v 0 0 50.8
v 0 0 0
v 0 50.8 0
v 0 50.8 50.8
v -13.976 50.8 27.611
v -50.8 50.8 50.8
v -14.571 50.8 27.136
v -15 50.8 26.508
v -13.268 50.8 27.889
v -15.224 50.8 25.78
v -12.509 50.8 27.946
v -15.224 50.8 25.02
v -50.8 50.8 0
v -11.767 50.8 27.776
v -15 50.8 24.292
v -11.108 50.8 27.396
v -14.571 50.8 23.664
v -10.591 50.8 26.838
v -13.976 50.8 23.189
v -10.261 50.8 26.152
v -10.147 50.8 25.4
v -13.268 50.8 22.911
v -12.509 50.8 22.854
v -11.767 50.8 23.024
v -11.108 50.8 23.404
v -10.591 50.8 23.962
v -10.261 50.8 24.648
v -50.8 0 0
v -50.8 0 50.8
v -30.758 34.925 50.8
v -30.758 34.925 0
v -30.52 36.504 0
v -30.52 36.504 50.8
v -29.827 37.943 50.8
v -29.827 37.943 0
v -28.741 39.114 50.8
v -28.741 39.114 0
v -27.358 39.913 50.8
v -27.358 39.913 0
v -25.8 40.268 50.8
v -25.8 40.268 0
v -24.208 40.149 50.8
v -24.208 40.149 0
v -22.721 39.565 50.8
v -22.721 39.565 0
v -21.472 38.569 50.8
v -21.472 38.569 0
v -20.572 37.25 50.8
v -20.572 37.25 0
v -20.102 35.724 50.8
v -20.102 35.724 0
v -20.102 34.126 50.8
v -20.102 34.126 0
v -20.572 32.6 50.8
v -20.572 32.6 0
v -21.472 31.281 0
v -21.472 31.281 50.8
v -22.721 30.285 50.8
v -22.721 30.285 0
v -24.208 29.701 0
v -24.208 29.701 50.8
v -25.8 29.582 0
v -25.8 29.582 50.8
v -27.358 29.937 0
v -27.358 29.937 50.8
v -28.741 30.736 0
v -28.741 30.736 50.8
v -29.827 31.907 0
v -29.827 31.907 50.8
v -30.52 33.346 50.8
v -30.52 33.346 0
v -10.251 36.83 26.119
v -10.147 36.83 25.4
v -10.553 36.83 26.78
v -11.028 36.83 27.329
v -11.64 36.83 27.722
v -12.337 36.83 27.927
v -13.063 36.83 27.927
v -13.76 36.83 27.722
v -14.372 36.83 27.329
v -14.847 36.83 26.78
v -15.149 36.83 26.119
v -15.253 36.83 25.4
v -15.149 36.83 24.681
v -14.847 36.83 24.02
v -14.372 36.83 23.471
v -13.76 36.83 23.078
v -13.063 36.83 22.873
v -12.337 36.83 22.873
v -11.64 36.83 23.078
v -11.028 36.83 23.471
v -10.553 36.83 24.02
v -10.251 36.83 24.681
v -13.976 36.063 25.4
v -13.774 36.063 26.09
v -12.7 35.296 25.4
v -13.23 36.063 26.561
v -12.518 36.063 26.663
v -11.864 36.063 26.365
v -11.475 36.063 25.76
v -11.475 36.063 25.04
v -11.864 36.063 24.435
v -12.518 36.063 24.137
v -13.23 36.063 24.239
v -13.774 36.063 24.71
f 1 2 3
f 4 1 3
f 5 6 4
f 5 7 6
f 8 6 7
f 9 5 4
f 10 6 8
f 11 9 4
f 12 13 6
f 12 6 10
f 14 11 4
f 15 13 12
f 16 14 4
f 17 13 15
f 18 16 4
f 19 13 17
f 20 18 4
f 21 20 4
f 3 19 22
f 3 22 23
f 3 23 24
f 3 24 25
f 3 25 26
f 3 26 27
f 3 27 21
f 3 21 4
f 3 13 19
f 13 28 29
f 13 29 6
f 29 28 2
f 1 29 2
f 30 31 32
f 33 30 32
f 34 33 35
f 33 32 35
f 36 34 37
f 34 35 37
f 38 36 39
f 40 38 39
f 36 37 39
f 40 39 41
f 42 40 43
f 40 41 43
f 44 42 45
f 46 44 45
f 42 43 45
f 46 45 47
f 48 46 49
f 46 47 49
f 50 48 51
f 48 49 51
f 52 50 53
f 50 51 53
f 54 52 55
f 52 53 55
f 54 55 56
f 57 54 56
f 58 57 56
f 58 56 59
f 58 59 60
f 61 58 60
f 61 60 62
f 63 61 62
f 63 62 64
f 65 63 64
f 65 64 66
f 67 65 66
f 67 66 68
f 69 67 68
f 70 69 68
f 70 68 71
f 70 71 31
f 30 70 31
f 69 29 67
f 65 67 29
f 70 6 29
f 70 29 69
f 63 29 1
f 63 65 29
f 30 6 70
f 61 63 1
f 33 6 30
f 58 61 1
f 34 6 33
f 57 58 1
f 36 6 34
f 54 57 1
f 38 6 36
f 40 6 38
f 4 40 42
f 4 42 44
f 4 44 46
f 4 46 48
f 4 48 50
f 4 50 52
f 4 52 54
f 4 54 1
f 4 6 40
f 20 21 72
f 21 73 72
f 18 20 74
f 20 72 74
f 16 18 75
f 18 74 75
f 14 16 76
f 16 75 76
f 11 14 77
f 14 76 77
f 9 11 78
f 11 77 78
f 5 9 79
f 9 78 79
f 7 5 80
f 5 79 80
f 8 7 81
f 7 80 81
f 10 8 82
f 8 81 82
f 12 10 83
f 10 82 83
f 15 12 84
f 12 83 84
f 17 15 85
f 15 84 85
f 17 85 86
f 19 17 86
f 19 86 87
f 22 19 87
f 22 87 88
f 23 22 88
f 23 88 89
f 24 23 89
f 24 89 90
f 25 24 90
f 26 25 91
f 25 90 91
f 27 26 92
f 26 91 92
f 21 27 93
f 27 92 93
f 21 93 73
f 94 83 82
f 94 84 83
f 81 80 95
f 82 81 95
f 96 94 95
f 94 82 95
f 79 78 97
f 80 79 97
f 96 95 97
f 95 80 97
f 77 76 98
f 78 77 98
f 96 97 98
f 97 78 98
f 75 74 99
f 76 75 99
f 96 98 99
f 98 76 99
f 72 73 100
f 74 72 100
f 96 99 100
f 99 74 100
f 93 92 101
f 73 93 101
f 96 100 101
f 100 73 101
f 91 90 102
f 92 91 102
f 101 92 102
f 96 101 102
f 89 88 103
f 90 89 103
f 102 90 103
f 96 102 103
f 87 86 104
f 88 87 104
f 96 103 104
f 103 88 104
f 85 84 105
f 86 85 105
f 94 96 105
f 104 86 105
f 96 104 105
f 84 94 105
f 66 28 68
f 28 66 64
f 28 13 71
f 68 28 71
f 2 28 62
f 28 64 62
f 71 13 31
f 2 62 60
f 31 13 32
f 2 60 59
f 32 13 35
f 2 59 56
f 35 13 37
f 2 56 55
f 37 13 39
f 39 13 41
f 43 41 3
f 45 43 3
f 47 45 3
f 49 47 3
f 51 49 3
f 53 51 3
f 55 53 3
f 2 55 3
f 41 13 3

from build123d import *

# Parameters (mm, degrees)
F0_W     = 50.8
F0_H     = 50.8
F1_DEPTH = 50.8
F3_D     = 10.71626
F5_D     = 5.1054
F5_DEPTH = 13.97
F5_TIP   = 1.5338169022


with BuildPart() as f1:
    # F0 (on Top) → F1 (new body)
    with BuildSketch(Plane.XY):
        with Locations((-25.4, 25.4)):
            Rectangle(F0_W, F0_H)
    extrude(amount=F1_DEPTH)

    # F3 (through all)
    with Locations(Plane.XY.offset(50.8)):
        with Locations((-25.4, 34.925)):
            Hole(F3_D / 2)

    # F5
    with Locations(Plane(origin=(0, 50.8, 0), x_dir=(-1, 0, 0), z_dir=(0, 1, 0))):
        with Locations((12.7, 25.4)):
            Hole(F5_D / 2, depth=F5_DEPTH)
            with Locations((0, 0, -(F5_DEPTH + F5_TIP / 2))):  # 118° drill point
                Cone(0, F5_D / 2, F5_TIP, mode=Mode.SUBTRACT)


solid = f1.part
